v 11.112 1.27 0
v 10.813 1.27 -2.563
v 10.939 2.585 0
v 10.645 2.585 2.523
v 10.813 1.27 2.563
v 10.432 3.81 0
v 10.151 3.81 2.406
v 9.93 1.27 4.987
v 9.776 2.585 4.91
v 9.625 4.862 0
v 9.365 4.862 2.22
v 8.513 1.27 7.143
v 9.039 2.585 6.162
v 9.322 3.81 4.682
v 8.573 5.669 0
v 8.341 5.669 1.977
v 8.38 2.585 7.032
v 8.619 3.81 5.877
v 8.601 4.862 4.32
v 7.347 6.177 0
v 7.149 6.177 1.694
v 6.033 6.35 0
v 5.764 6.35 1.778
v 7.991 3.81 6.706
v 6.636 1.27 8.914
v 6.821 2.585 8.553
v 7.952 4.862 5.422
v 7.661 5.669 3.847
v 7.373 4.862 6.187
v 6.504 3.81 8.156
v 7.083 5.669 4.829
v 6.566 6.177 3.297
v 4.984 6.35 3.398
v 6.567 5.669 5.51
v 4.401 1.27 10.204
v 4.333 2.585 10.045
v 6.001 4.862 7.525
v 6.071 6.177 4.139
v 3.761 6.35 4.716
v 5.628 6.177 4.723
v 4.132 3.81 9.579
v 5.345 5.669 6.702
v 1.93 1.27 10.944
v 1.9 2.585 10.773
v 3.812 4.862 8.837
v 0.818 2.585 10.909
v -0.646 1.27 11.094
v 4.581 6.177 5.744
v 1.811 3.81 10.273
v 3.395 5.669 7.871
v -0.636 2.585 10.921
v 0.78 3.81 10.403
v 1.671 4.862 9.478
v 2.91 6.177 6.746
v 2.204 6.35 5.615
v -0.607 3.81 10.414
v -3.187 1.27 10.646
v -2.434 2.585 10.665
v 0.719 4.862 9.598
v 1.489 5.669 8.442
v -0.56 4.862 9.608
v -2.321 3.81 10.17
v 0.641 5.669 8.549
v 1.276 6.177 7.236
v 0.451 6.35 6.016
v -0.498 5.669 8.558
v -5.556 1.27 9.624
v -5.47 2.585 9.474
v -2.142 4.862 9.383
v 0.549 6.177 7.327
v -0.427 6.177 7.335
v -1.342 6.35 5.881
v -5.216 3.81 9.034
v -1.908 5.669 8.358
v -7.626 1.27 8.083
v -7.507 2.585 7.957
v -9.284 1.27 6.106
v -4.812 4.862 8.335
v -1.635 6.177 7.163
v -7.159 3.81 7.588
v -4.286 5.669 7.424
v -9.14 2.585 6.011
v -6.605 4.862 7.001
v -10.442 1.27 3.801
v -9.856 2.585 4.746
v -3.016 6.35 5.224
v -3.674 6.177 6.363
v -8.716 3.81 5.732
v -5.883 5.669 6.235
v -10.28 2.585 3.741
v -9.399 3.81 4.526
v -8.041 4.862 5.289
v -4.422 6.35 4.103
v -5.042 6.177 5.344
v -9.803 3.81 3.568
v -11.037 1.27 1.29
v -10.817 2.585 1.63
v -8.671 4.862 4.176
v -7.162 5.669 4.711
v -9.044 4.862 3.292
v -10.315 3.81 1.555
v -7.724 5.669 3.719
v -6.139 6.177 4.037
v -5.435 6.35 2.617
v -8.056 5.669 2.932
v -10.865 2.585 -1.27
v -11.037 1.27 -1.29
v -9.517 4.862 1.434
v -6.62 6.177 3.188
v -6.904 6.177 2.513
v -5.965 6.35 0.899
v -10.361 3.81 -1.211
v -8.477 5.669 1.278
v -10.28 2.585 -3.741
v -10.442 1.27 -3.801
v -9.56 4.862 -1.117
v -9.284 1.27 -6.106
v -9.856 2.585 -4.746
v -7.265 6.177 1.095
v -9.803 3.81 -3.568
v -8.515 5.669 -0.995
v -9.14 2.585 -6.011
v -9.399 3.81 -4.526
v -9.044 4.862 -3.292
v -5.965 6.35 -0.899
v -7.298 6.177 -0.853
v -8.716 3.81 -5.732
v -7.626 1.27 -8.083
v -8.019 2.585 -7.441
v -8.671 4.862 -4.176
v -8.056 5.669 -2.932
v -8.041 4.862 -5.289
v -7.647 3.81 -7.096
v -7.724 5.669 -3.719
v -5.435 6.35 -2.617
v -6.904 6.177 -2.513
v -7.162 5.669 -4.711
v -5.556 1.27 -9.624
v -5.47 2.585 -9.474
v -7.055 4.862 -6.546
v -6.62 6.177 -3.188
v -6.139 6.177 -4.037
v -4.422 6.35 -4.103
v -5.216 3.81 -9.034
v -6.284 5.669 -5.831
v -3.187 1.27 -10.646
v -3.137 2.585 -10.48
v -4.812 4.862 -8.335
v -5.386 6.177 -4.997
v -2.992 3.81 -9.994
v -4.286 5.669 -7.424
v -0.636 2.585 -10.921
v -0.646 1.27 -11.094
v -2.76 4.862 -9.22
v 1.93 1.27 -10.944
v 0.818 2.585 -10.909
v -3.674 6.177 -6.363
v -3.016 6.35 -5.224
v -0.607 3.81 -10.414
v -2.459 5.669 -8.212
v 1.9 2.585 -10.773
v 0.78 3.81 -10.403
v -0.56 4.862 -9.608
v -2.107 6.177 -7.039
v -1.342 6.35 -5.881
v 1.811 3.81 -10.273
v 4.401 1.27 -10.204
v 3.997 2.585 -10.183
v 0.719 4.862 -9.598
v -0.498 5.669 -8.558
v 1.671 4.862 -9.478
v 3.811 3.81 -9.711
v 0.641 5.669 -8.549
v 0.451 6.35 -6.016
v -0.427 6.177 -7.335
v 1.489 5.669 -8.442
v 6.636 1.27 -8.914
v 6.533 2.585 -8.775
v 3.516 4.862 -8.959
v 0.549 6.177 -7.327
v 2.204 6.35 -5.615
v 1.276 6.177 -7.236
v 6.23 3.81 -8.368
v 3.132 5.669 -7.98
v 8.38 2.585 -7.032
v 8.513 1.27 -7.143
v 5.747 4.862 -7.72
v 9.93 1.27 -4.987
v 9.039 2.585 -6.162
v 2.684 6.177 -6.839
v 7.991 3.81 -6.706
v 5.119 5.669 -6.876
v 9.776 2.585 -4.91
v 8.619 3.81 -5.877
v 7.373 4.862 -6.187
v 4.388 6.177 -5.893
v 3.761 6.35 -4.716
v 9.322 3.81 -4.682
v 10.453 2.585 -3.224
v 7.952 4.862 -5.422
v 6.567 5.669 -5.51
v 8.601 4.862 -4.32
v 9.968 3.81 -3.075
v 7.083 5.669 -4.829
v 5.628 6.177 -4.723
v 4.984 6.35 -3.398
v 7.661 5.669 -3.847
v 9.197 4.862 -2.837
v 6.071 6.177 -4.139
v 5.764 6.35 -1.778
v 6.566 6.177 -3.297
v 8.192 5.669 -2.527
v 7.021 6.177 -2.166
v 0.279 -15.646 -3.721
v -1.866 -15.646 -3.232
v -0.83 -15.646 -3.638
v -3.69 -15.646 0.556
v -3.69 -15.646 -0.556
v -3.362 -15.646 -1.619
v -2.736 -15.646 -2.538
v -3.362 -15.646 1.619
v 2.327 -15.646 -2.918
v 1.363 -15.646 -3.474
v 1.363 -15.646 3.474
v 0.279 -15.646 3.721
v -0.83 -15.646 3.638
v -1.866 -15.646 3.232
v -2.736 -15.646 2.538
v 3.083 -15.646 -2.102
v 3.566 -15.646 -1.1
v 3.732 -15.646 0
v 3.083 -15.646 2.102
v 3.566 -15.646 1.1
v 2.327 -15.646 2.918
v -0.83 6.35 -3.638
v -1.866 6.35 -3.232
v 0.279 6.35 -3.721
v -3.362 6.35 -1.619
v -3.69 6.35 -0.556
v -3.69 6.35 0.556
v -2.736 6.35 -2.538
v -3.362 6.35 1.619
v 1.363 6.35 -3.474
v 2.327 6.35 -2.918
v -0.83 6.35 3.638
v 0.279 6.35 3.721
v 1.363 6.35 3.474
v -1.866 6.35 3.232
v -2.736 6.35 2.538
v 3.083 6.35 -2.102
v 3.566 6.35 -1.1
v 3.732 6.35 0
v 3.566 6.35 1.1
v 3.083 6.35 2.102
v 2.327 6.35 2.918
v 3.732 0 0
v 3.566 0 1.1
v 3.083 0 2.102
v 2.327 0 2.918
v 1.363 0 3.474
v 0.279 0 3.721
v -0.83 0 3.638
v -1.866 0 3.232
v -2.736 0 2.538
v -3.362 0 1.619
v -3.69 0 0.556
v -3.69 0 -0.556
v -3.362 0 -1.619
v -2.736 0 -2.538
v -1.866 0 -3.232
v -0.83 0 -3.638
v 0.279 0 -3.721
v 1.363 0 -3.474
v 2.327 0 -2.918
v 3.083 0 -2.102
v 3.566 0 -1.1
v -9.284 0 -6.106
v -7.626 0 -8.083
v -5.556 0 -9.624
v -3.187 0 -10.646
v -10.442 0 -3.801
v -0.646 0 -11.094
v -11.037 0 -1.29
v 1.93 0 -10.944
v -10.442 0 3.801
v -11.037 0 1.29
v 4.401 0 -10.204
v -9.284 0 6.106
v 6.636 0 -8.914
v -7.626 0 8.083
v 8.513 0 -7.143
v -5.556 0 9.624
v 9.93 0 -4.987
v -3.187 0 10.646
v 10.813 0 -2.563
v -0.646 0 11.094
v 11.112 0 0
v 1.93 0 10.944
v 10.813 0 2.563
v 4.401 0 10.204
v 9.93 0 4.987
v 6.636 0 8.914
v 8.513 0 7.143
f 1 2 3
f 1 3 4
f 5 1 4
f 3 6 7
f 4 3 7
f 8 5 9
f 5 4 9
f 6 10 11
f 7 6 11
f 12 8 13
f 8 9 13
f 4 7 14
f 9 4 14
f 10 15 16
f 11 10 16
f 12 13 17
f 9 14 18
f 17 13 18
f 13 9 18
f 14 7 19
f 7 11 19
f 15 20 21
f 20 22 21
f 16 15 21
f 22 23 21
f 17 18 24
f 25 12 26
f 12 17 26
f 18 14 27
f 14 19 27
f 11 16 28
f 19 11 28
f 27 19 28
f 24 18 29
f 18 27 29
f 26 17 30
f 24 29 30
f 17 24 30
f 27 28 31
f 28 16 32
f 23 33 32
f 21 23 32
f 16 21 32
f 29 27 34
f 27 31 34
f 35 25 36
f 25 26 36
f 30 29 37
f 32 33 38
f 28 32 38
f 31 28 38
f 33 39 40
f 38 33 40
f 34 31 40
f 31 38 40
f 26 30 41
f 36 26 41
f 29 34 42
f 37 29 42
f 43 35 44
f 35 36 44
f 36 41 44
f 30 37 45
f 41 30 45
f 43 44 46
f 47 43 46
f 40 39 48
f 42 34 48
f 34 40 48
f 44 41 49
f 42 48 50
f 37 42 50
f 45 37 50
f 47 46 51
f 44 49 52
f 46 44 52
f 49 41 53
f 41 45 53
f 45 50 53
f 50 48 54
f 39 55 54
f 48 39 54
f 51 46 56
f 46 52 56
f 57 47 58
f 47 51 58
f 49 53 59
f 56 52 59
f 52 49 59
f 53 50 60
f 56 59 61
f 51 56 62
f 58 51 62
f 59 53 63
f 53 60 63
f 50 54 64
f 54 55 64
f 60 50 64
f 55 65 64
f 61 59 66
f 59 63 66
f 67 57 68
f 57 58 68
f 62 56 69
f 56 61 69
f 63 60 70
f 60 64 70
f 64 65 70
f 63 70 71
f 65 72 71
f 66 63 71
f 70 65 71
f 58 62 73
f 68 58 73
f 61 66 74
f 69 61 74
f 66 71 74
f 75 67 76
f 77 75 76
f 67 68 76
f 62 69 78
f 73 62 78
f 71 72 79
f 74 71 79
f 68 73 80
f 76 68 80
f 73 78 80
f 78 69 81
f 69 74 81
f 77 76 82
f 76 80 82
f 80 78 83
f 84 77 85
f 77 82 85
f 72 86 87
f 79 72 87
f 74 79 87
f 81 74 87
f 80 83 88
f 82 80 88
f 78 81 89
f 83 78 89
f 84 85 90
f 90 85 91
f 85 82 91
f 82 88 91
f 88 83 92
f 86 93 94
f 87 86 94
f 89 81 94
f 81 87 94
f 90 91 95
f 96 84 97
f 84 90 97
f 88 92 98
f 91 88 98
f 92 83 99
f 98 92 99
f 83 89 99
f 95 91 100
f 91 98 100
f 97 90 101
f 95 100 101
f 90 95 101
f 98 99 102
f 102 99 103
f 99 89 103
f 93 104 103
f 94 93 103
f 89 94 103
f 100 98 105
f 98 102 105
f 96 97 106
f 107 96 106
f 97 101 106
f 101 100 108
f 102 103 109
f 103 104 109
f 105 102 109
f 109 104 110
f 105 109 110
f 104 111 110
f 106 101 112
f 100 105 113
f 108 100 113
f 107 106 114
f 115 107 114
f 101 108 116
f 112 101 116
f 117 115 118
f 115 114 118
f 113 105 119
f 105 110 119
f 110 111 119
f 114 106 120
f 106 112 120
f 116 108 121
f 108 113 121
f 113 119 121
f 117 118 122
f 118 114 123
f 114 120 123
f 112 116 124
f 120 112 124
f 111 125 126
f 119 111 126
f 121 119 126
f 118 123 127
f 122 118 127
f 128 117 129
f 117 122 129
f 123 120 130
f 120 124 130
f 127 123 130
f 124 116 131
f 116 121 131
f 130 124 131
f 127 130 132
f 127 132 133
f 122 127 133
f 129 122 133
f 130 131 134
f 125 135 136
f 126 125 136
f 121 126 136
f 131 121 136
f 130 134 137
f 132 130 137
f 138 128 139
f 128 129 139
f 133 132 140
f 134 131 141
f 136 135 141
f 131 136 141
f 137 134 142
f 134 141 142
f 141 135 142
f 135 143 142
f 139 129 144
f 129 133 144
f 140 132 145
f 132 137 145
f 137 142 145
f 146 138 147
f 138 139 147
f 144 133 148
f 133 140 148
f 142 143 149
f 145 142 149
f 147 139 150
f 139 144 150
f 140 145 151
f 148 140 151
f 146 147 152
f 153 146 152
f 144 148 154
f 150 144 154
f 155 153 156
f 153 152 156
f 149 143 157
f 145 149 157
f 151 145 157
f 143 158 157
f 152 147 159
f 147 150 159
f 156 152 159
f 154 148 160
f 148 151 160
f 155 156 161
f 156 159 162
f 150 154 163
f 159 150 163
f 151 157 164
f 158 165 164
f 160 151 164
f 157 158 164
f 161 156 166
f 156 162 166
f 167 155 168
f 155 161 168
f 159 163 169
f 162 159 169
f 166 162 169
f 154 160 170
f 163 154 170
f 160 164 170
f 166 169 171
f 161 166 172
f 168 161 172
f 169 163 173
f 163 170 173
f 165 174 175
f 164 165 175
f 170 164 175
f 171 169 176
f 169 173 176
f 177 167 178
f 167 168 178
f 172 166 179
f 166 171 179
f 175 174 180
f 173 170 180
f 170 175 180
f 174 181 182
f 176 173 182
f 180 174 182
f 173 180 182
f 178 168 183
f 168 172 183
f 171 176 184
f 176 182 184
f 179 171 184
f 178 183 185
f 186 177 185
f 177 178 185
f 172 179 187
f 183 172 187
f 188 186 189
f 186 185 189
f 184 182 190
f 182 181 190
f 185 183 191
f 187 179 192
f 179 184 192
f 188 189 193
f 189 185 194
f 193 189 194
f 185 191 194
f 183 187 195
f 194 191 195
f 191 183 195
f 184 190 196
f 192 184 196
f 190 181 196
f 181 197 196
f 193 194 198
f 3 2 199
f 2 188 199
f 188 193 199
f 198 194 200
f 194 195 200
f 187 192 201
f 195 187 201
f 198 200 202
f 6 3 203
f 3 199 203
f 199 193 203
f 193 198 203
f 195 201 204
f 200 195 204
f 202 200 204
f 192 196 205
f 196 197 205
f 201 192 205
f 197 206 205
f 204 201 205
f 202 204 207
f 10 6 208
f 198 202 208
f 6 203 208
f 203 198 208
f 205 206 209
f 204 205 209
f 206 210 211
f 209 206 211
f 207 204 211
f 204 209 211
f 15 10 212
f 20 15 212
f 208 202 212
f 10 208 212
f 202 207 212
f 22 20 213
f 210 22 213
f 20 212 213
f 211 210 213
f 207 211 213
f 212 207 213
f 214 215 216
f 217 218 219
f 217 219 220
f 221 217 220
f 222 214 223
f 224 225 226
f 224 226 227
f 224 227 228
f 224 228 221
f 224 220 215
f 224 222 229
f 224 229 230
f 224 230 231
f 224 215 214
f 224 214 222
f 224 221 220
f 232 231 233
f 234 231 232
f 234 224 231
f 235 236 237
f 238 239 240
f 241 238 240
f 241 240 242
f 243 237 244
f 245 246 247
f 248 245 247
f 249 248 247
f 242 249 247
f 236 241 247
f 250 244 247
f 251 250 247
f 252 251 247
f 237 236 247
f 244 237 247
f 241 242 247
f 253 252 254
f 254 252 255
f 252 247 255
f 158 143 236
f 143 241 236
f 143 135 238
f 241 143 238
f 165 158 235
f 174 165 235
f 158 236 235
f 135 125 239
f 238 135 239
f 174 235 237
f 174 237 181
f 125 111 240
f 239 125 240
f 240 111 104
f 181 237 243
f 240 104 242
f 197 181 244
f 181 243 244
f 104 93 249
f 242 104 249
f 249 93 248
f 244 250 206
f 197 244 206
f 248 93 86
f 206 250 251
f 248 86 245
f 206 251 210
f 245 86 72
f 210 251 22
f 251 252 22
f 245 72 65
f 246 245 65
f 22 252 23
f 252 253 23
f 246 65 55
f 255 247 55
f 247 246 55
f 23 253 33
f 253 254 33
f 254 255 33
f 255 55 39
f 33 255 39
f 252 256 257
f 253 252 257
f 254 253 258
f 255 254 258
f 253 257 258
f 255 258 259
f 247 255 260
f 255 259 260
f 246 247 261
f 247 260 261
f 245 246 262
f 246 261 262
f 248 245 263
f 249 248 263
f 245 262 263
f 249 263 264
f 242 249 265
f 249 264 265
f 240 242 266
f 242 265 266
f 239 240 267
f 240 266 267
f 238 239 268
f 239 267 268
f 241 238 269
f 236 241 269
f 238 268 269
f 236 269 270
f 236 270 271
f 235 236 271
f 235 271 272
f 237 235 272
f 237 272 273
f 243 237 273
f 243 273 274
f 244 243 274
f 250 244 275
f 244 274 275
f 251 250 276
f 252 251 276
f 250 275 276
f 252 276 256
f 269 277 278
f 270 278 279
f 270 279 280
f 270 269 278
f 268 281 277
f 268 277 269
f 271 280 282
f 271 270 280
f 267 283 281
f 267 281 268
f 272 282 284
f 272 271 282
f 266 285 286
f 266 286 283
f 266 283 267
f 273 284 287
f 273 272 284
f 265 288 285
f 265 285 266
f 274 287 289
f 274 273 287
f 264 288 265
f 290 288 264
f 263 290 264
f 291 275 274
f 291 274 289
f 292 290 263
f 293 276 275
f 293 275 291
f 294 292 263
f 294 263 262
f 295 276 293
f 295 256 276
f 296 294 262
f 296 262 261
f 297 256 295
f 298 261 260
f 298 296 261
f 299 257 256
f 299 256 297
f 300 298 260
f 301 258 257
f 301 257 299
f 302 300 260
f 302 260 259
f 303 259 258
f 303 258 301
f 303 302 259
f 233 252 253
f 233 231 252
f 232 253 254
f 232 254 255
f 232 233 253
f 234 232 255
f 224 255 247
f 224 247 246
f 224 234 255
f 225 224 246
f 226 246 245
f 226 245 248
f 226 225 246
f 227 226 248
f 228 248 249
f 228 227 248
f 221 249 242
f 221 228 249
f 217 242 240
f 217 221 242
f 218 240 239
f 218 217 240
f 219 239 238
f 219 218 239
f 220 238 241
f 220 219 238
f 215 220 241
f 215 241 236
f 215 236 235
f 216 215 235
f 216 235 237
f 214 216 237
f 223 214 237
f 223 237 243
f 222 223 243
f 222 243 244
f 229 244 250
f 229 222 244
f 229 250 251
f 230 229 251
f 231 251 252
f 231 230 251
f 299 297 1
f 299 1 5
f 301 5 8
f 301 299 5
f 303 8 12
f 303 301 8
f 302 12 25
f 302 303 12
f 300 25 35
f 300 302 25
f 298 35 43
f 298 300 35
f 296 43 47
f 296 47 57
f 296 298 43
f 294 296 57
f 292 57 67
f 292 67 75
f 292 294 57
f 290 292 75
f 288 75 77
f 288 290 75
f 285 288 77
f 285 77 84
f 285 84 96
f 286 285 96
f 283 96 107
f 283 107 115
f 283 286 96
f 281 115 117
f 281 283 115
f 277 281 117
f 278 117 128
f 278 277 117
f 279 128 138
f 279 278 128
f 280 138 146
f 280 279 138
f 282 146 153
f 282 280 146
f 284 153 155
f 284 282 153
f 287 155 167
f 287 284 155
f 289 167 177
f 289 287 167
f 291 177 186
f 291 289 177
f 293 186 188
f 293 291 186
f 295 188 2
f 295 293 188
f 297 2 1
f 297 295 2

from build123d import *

# Parameters (mm, degrees)
F0_R     = 3.7317681235
F1_DEPTH = 15.6464
F0_R_2   = 11.1125
F2_DEPTH = 6.35
F3_R     = 5.08
F4_DEPTH = 6.35


with BuildPart() as f1:
    # F0 (on Front) → F1 (new body)
    with BuildSketch(Plane.XZ):
        Circle(F0_R)
    extrude(amount=F1_DEPTH)

    # F4 (add, through all): a face of the model
    f4_faces = [f1.faces().sort_by_distance(p)[0] for p in [
        (0, 0, 0),
    ]]
    extrude(f4_faces, amount=F4_DEPTH)


with BuildPart() as f2:
    # F0 (on Front) → F2 (new body)
    with BuildSketch(Plane.XZ):
        Circle(F0_R_2)
        Circle(F0_R, mode=Mode.SUBTRACT)
    extrude(amount=-F2_DEPTH)

    # F3
    f3_edges = [f2.edges().sort_by_distance(p)[0] for p in [
        (-11.1125, 6.35, 0),
    ]]
    fillet(f3_edges, radius=F3_R)


solid = Compound([f1.part, f2.part])
